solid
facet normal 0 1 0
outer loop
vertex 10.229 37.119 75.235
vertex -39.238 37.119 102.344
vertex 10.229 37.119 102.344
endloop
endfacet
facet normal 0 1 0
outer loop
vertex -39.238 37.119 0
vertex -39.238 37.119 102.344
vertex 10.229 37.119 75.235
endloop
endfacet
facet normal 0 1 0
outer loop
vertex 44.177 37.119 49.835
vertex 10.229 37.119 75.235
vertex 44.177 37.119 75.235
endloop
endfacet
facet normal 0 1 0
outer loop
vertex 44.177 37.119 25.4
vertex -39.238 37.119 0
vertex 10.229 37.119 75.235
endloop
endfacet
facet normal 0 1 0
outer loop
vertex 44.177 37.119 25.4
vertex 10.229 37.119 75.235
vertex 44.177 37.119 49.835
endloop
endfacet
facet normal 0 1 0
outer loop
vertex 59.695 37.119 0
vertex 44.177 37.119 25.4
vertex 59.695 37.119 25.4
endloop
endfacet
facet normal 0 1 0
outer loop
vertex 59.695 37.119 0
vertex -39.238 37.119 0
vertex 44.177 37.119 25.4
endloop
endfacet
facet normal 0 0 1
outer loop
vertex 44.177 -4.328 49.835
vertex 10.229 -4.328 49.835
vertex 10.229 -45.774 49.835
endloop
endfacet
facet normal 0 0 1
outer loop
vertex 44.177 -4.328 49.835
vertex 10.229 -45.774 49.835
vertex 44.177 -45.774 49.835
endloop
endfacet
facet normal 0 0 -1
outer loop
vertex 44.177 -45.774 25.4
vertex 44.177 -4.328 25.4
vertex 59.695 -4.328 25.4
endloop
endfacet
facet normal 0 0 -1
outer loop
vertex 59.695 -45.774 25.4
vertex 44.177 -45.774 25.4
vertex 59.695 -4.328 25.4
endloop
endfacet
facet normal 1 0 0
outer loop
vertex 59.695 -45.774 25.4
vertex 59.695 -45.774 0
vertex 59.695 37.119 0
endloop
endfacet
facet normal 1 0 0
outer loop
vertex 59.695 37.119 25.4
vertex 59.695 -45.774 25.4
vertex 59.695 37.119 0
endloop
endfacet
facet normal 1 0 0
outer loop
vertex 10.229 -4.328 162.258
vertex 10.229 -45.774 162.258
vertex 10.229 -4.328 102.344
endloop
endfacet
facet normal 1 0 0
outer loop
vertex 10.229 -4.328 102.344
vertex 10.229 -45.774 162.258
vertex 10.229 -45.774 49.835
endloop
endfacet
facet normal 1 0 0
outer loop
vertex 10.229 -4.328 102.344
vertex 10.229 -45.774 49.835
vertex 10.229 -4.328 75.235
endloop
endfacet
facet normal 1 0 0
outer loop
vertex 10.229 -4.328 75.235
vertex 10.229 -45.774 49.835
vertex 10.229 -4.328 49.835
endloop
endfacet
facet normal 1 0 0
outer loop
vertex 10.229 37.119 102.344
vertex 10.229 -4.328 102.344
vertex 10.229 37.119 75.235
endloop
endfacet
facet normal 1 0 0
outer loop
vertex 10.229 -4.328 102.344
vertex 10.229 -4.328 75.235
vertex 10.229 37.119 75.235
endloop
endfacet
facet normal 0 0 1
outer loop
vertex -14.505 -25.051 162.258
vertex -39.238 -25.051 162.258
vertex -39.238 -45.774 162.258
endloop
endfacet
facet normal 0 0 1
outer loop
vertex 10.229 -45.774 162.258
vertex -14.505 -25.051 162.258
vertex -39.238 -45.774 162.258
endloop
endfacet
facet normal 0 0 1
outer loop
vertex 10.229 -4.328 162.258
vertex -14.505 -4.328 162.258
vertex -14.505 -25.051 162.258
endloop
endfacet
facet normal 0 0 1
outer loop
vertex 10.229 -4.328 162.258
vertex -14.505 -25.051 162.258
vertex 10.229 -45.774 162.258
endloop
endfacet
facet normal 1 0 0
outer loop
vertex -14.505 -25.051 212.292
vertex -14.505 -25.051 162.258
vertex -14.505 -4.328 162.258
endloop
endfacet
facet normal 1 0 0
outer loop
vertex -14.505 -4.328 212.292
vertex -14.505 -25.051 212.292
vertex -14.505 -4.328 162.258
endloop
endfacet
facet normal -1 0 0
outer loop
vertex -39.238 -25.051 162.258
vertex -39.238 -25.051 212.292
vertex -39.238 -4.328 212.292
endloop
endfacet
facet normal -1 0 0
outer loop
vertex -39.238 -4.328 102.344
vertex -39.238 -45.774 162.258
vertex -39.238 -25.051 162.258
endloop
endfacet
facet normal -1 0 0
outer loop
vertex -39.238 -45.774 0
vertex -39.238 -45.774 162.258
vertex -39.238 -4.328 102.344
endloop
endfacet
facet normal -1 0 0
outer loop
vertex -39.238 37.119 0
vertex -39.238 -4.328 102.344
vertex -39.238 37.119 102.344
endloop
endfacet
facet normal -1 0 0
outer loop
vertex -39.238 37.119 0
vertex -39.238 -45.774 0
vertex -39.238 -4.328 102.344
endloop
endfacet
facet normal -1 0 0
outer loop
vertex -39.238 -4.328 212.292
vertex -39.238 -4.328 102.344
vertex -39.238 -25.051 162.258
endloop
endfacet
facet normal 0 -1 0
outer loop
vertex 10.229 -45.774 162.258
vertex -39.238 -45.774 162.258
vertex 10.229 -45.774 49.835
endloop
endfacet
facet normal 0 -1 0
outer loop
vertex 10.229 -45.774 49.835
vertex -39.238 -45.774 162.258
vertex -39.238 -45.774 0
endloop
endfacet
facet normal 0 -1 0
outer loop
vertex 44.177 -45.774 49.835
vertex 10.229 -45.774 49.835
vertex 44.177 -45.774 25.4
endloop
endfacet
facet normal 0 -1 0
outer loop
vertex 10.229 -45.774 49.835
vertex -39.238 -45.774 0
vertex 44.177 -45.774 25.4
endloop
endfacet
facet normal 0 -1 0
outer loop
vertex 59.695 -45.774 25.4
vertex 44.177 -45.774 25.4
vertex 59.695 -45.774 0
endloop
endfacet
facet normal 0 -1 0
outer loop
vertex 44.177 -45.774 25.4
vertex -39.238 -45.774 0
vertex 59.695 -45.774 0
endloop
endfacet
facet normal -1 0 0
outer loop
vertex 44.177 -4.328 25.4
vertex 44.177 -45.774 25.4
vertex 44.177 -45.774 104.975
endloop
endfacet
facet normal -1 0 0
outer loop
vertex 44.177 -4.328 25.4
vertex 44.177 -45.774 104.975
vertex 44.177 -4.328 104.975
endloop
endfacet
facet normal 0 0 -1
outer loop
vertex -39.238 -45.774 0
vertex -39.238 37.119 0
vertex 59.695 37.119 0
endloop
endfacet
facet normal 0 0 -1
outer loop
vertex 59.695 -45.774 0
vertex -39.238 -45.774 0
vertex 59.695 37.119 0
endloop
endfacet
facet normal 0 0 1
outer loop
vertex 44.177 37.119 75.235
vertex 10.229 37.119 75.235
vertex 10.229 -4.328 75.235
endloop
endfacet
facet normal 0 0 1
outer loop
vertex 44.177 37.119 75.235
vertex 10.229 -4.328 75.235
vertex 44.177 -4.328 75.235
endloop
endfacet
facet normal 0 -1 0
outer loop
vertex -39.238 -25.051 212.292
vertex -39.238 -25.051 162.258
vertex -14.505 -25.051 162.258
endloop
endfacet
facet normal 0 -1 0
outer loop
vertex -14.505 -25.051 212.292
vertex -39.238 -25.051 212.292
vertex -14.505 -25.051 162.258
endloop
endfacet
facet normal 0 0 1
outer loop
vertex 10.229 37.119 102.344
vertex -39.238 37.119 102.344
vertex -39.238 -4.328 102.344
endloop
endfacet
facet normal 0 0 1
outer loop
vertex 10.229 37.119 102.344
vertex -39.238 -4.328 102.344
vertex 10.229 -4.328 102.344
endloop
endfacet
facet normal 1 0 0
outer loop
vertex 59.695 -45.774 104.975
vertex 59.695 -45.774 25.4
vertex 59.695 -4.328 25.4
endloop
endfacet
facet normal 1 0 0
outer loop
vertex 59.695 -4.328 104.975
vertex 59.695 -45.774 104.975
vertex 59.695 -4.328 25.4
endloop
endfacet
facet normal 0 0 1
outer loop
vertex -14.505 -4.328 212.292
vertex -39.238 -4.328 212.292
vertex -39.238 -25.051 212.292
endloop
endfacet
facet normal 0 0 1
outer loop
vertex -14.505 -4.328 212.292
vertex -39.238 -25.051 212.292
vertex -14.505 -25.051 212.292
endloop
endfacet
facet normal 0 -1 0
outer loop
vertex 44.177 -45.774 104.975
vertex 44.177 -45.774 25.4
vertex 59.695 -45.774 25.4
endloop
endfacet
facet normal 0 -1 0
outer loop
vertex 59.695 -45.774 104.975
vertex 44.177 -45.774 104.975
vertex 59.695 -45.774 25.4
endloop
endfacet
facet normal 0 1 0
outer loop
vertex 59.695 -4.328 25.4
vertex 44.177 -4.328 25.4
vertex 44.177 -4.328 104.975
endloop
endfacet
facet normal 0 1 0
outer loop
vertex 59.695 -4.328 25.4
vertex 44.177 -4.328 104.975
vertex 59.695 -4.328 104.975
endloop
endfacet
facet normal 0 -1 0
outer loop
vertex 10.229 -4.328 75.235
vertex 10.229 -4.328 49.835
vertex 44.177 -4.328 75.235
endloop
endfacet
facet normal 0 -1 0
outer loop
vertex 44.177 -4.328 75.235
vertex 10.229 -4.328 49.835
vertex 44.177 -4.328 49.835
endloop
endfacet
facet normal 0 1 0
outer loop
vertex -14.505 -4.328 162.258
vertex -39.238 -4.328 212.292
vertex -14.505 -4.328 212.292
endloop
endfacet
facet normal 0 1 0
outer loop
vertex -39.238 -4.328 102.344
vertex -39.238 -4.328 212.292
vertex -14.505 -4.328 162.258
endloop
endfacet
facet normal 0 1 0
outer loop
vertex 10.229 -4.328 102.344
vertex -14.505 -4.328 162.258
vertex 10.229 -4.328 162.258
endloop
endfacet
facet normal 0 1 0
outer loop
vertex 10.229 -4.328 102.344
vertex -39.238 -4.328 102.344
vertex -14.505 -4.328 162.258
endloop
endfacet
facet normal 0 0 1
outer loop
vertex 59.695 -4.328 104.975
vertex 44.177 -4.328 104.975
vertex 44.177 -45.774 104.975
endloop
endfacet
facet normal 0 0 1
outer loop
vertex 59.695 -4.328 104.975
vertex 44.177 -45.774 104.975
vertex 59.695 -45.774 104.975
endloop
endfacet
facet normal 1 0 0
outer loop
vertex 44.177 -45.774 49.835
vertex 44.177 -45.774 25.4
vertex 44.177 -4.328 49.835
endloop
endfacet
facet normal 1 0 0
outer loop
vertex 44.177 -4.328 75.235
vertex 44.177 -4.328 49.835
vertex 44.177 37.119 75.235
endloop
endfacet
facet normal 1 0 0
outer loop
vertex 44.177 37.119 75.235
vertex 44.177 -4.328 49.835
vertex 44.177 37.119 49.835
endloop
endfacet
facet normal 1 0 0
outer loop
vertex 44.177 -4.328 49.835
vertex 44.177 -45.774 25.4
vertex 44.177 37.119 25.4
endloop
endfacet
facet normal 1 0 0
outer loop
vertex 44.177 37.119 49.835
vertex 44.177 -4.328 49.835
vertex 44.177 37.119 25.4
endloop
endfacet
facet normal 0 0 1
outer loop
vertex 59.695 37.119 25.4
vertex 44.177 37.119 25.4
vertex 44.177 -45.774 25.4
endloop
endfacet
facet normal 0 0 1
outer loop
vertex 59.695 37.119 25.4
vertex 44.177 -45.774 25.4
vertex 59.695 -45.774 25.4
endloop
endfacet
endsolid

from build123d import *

# Parameters (mm, degrees)
F0_W      = 49.4665689766
F0_H      = 82.8934758902
F1_DEPTH  = 102.3439634591
F0_W_2    = 33.9484252036
F2_DEPTH  = 49.8349424452
F0_W_3    = 15.5181437731
F3_DEPTH  = 25.4
F4_W      = 49.4665689766
F4_H      = 41.4467379451
F7_DEPTH  = 59.9138829857
F8_W      = 24.7332844883
F8_H      = 20.7233689725
F9_DEPTH  = 50.0340741128
F5_W      = 33.9484252036
F5_H      = 41.4467379451
F10_DEPTH = 25.4
F6_W      = 15.5181437731
F6_H      = 41.4467379451
F11_DEPTH = 79.5750487596


with BuildPart() as f1:
    # F0 (on Top) → F1 (new body)
    with BuildSketch(Plane.XY):
        with Locations((-14.5046841353, -4.3277069926)):
            Rectangle(F0_W, F0_H)
    extrude(amount=F1_DEPTH)

    # F0 (on Top) → F2 (join)
    with BuildSketch(Plane.XY):
        with Locations((27.2028129548, -4.3277069926)):
            Rectangle(F0_W_2, F0_H)
    extrude(amount=F2_DEPTH)

    # F0 (on Top) → F3 (join)
    with BuildSketch(Plane.XY):
        with Locations((51.9360974431, -4.3277069926)):
            Rectangle(F0_W_3, F0_H)
    extrude(amount=F3_DEPTH)

    # F4 (on face) → F7 (join)
    with BuildSketch(Plane.XY.offset(102.3439634591)):
        with Locations((-14.5046841353, -25.0510759652)):
            Rectangle(F4_W, F4_H)
    extrude(amount=F7_DEPTH)

    # F8 (on face) → F9 (join)
    with BuildSketch(Plane.XY.offset(162.2578464448)):
        with Locations((-26.8713263795, -14.6893914789)):
            Rectangle(F8_W, F8_H)
    extrude(amount=F9_DEPTH)

    # F5 (on face) → F10 (join)
    with BuildSketch(Plane.XY.offset(49.8349424452)):
        with Locations((27.2028129548, 16.3956619799)):
            Rectangle(F5_W, F5_H)
    extrude(amount=F10_DEPTH)


with BuildPart() as f11:
    # F6 (on face) → F11 (new body)
    with BuildSketch(Plane.XY.offset(25.4)):
        with Locations((51.9360974431, -25.0510759652)):
            Rectangle(F6_W, F6_H)
    extrude(amount=F11_DEPTH)


solid = Compound([f1.part, f11.part])
